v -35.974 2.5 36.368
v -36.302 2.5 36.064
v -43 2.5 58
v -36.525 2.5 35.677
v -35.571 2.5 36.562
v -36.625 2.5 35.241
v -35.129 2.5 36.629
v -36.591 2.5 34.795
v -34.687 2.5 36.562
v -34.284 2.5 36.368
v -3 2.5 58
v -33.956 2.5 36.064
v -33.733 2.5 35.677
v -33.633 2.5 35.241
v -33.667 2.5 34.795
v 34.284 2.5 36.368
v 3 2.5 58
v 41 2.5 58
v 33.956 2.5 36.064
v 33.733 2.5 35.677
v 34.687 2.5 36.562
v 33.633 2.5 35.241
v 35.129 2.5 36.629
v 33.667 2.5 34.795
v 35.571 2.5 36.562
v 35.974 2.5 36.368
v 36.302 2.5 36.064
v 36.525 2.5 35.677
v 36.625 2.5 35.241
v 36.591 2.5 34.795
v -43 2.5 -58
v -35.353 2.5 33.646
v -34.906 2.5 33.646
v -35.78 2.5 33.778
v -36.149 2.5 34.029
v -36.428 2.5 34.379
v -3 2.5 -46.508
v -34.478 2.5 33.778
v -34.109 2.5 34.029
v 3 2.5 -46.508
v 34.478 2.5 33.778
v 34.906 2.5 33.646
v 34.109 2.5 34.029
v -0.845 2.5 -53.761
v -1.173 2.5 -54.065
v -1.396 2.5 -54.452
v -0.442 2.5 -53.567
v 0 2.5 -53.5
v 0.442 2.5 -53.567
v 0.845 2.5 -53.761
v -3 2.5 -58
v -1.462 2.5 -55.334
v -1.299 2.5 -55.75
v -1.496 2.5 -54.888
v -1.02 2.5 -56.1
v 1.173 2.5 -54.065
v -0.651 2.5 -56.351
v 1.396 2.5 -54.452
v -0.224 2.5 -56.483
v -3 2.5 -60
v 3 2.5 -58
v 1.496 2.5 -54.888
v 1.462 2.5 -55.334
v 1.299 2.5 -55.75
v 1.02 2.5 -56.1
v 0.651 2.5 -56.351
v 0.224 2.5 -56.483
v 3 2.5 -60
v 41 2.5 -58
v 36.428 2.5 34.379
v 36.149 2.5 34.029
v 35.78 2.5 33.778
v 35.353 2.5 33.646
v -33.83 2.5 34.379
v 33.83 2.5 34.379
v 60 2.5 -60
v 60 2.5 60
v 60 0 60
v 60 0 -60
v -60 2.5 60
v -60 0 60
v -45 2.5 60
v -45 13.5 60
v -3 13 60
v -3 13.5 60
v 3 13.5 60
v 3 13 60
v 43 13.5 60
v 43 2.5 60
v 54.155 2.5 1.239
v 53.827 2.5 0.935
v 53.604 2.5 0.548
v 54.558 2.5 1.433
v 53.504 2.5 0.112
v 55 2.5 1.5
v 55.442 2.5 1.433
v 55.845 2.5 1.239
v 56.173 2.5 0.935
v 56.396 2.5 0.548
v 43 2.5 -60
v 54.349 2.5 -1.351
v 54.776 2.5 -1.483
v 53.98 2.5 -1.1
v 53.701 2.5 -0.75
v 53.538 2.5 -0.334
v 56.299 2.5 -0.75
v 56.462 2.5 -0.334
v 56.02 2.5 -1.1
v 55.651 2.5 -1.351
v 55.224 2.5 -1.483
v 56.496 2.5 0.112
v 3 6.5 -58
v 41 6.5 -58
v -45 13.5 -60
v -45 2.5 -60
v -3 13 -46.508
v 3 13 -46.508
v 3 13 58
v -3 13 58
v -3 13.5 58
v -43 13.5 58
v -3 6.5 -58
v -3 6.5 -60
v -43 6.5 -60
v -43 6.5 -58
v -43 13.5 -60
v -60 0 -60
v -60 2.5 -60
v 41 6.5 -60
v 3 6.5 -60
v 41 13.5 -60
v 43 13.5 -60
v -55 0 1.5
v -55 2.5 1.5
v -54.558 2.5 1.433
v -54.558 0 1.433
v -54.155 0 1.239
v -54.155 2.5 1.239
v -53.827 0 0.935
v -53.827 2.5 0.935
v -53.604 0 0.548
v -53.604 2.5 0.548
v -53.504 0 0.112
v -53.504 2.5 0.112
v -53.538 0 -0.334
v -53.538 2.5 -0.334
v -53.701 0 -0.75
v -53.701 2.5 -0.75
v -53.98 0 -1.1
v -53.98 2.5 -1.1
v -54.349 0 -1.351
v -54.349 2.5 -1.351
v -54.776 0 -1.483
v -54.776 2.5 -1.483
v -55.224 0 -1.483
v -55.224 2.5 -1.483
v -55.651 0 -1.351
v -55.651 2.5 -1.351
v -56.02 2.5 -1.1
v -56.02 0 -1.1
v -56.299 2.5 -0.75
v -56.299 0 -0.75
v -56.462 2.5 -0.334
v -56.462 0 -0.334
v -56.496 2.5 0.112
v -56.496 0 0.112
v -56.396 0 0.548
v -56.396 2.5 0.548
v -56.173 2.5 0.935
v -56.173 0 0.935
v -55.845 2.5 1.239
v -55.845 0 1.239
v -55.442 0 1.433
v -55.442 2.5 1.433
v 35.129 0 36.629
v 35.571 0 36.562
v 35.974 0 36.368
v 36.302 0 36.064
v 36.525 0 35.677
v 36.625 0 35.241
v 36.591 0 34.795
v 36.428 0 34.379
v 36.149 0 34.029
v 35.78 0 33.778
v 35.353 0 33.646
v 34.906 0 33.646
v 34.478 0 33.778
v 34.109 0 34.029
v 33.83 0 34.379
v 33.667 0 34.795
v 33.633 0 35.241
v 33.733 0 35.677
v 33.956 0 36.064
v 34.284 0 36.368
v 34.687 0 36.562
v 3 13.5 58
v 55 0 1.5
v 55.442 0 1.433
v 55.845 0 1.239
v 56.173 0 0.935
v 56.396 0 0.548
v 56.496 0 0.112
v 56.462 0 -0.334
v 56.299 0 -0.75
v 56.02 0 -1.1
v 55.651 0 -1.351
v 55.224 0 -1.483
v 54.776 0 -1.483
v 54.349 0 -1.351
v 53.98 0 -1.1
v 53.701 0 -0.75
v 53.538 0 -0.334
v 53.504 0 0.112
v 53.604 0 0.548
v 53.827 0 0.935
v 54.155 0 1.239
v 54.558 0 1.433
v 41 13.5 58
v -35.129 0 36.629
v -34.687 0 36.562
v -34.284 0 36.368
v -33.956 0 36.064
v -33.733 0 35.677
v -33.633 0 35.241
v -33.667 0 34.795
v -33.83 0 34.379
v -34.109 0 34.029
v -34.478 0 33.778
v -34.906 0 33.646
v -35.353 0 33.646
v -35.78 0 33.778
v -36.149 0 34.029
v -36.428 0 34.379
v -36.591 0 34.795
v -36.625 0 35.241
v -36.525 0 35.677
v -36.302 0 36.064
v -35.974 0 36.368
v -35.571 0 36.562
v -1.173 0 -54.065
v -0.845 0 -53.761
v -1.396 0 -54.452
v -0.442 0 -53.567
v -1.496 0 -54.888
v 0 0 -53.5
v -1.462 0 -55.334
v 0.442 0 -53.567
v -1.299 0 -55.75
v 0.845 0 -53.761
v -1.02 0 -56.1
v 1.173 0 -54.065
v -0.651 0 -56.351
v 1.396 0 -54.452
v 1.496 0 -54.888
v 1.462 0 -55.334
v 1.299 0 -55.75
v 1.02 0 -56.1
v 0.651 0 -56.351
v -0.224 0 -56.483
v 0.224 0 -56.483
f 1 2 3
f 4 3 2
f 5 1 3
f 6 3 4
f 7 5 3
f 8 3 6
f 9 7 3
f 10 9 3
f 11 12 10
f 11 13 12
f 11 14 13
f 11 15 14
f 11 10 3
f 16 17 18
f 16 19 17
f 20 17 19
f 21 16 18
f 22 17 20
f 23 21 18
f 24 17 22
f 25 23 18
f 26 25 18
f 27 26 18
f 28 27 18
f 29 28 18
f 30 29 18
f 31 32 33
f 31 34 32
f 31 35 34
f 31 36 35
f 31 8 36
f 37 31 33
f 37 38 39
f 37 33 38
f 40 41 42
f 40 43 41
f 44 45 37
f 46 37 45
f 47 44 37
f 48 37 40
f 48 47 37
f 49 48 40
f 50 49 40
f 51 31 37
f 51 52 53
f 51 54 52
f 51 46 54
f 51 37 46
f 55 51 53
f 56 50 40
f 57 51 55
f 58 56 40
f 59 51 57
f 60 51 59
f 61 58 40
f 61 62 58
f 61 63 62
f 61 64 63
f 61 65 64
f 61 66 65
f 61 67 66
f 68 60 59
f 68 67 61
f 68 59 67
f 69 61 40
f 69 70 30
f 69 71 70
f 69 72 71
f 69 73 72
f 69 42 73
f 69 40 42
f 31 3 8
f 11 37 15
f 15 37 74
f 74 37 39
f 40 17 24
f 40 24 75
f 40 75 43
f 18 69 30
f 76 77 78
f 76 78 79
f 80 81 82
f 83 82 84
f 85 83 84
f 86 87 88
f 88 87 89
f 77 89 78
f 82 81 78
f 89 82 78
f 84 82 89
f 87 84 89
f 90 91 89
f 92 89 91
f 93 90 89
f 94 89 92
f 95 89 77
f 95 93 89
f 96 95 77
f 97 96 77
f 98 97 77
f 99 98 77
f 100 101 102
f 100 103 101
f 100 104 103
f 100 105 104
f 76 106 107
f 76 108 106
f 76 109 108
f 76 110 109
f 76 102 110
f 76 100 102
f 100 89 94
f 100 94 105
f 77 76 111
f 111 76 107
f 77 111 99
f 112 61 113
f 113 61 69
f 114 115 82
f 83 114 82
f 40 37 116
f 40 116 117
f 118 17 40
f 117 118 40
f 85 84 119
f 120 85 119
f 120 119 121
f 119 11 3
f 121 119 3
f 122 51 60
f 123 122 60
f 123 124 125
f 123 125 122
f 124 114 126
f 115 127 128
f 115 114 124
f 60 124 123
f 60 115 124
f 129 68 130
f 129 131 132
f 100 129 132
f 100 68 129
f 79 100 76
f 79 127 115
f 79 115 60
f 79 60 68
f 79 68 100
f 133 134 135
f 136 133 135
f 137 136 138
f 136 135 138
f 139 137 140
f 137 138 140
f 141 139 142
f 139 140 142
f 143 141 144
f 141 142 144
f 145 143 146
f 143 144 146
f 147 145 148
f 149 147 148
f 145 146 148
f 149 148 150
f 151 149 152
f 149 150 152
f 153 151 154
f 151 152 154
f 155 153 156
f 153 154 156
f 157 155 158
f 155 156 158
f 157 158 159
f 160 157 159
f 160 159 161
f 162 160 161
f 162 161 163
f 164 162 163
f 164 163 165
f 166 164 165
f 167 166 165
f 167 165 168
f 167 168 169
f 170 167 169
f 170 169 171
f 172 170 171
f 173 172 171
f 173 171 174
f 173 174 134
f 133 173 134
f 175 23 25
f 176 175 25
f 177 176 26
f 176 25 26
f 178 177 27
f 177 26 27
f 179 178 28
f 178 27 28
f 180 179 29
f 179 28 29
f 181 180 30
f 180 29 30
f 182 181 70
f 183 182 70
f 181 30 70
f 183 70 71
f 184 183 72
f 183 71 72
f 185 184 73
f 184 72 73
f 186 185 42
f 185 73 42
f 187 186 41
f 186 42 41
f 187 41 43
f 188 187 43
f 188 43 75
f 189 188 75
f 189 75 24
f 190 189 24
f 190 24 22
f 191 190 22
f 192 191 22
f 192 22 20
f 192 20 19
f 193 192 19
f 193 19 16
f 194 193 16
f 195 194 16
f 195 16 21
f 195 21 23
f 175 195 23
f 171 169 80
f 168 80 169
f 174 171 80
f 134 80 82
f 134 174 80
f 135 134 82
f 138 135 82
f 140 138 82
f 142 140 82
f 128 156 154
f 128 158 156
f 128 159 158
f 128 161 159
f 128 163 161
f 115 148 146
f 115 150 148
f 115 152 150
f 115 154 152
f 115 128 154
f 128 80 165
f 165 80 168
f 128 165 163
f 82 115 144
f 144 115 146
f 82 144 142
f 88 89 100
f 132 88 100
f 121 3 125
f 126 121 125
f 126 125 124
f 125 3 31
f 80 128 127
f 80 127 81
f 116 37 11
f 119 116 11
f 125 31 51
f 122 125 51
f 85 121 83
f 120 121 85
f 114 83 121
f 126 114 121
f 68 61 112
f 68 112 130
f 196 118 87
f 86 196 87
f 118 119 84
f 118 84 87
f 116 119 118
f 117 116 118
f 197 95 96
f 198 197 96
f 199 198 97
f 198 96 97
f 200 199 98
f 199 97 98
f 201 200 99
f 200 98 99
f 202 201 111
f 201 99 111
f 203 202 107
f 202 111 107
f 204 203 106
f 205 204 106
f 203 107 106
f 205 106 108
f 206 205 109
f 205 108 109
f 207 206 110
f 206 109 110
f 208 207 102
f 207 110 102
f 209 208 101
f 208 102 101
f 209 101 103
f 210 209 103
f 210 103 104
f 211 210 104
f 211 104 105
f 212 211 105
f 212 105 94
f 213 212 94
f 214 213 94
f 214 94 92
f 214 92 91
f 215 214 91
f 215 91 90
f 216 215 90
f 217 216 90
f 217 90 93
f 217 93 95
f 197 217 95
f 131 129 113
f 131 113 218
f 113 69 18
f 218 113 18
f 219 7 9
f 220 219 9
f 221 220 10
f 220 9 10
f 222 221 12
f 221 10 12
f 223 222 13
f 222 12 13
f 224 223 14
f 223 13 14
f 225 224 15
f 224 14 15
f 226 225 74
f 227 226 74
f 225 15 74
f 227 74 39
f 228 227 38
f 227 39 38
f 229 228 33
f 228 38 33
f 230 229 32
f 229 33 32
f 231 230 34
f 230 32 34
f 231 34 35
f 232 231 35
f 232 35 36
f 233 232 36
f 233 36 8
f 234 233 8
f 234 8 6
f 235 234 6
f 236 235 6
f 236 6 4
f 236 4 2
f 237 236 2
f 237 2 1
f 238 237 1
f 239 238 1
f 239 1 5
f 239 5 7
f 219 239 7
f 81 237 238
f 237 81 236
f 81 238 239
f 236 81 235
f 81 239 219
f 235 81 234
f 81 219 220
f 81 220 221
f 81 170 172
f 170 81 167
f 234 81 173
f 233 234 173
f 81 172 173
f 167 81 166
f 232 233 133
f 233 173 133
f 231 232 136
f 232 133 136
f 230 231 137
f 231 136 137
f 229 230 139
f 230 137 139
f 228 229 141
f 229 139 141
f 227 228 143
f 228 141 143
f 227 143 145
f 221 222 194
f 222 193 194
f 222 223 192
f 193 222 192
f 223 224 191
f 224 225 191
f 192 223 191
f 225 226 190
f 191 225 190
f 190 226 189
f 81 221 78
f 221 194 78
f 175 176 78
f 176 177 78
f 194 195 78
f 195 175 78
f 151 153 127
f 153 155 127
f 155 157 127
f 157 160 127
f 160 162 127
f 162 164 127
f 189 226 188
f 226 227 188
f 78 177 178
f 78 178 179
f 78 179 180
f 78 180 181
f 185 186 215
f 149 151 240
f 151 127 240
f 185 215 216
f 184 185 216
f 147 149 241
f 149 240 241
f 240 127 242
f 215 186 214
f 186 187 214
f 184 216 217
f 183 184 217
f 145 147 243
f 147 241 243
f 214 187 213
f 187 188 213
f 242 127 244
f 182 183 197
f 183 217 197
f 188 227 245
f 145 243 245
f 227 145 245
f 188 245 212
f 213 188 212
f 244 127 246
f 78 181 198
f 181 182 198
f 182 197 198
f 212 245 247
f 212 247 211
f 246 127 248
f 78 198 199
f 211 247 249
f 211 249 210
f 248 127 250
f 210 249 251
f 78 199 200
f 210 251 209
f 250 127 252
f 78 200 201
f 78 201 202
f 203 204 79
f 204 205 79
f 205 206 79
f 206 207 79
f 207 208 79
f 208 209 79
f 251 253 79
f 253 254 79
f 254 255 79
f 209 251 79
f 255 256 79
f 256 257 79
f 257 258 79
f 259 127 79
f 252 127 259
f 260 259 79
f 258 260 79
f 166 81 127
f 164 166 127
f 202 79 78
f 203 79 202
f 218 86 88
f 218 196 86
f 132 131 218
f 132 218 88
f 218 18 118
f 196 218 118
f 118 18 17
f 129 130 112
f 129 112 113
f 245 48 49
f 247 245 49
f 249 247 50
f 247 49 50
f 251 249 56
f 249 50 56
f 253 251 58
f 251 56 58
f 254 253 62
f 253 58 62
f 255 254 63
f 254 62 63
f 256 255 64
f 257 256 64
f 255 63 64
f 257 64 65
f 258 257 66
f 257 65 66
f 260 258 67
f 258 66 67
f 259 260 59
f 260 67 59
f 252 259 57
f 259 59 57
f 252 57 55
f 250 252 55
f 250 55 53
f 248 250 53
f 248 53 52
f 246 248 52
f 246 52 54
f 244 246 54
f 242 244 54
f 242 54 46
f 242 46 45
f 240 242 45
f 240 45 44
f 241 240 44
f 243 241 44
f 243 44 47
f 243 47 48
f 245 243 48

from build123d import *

# Parameters (mm, degrees)
BOSS_EXTRUDE3_DEPTH  = 2.5
BOSS_EXTRUDE4_DEPTH  = 2.5
BOSS_EXTRUDE5_DEPTH  = 10.5
BOSS_EXTRUDE8_DEPTH  = 11
BOSS_EXTRUDE9_DEPTH  = 11
SKETCH8_W            = 84
SKETCH8_H            = 2
BOSS_EXTRUDE11_DEPTH = 4
SKETCH9_W            = 6
SKETCH9_H            = 7.053661792
CUT_EXTRUDE1_DEPTH   = 28
SKETCH10_W           = 6
SKETCH10_H           = 6.438726715
CUT_EXTRUDE4_DEPTH   = 11
SKETCH11_R           = 1.5
CUT_EXTRUDE5_DEPTH   = 14
SKETCH13_R           = 1.5
CUT_EXTRUDE6_DEPTH   = 14
SKETCH15_R           = 1.5
CUT_EXTRUDE7_DEPTH   = 14


with BuildPart() as part:
    # Sketch1 → Boss-Extrude3 (new body)
    with BuildSketch(Plane(origin=(0, 0, 0), x_dir=(1, 0, 0), z_dir=(0, 1, 0))):
        with BuildLine():
            Line((-44.72135955, -40), (0, -40))
            Line((0, -40), (44.72135955, -40))
            ThreePointArc((44.72135955, -40), (56.050341538, -21.409325386), (60, 0))
            ThreePointArc((60, 0), (-21.409325386, 56.050341538), (-44.72135955, -40))
        make_face()
        with BuildLine():
            Line((-33.166247904, -50), (0, -50))
            Line((0, -50), (0, -40))
            Line((0, -40), (-44.72135955, -40))
            ThreePointArc((-44.72135955, -40), (-39.2634671, -45.369374597), (-33.166247904, -50))
        make_face()
        with BuildLine():
            Line((0, -40), (0, -50))
            Line((0, -50), (33.166247904, -50))
            ThreePointArc((33.166247904, -50), (39.2634671, -45.369374597), (44.72135955, -40))
            Line((44.72135955, -40), (0, -40))
        make_face()
        with BuildLine():
            Line((0, -50), (0, -60))
            add(Edge.make_bspline(
                [(0, -60), (2.493909774, -59.986931125), (4.933150425, -59.785698627)],
                knots=[0, 0, 0, 0.138485859, 0.138485859, 0.138485859], degree=2))
            add(Edge.make_bspline(
                [(4.933150425, -59.785698627), (12.350363719, -59.151298506), (19.667130305, -57.122142348), (26.368544437, -53.878843782)],
                knots=[0.549095967, 0.549095967, 0.549095967, 0.549095967, 0.769976712, 0.769976712, 0.769976712, 0.769976712], degree=3))
            add(Edge.make_bspline(
                [(26.368544437, -53.878843782), (29.836187059, -52.176190697), (33.166247904, -50)],
                knots=[0.7803077, 0.7803077, 0.7803077, 1, 1, 1], degree=2))
            Line((33.166247904, -50), (0, -50))
        make_face()
        with BuildLine():
            add(Edge.make_bspline(
                [(-9.467287752, -59.24160526), (-4.836502075, -59.974590334), (0, -60)],
                knots=[0.731444001, 0.731444001, 0.731444001, 1, 1, 1], degree=2))
            Line((0, -60), (0, -50))
            Line((0, -50), (-33.166247904, -50))
            add(Edge.make_bspline(
                [(-33.166247904, -50), (-28.091057223, -53.316740978), (-22.696065652, -55.533505256)],
                knots=[0, 0, 0, 0.334842238, 0.334842238, 0.334842238], degree=2))
            add(Edge.make_bspline(
                [(-22.696065652, -55.533505256), (-18.44552317, -57.261077796), (-13.998129322, -58.510750178), (-9.467287752, -59.24160526)],
                knots=[0.269647974, 0.269647974, 0.269647974, 0.269647974, 0.406041898, 0.406041898, 0.406041898, 0.406041898], degree=3))
        make_face()
    extrude(amount=BOSS_EXTRUDE3_DEPTH)

    # Sketch3 → Boss-Extrude4 (add)
    with BuildSketch(Plane(origin=(0, 2.5, 0), x_dir=(1, 0, 0), z_dir=(0, 1, 0))):
        Polygon((0, 60), (-60, 60), (-60, -60), (60, -60), (60, 60), align=None)
    extrude(amount=-BOSS_EXTRUDE4_DEPTH)

    # Sketch4 → Boss-Extrude5 (add)
    with BuildSketch(Plane(origin=(0, 2.5, 0), x_dir=(1, 0, 0), z_dir=(0, 1, 0))):
        Polygon((3, 60), (0, 60), (-3, 60), (-3, -60), (3, -60), align=None)
    extrude(amount=BOSS_EXTRUDE5_DEPTH)

    # Sketch5 → Boss-Extrude8 (add)
    with BuildSketch(Plane(origin=(0, 2.5, 0), x_dir=(1, 0, 0), z_dir=(0, 1, 0))):
        Polygon((-43, -60), (-3, -60), (-3, -58), (-43, -58), (-43, 60), (-45, 60), (-45, -58), (-45, -60), align=None)
    extrude(amount=BOSS_EXTRUDE8_DEPTH)

    # Sketch7 → Boss-Extrude9 (add)
    with BuildSketch(Plane(origin=(0, 2.5, 0), x_dir=(1, 0, 0), z_dir=(0, 1, 0))):
        Polygon((3, -60), (43, -60), (43, 60), (41, 60), (41, -58), (3, -58), align=None)
    extrude(amount=BOSS_EXTRUDE9_DEPTH)

    # Sketch8 → Boss-Extrude11 (add)
    with BuildSketch(Plane(origin=(0, 2.5, 0), x_dir=(1, 0, 0), z_dir=(0, 1, 0))):
        with Locations((-1, 59)):
            Rectangle(SKETCH8_W, SKETCH8_H)
    extrude(amount=BOSS_EXTRUDE11_DEPTH)

    # Sketch9 → Cut-Extrude1 (cut)
    with BuildSketch(Plane(origin=(0, 2.5, 0), x_dir=(1, 0, 0), z_dir=(0, 1, 0))):
        with Locations((0, 56.473169104)):
            Rectangle(SKETCH9_W, SKETCH9_H)
    extrude(amount=CUT_EXTRUDE1_DEPTH, mode=Mode.SUBTRACT)

    # Sketch10 → Cut-Extrude4 (cut)
    with BuildSketch(Plane(origin=(0, 2.5, 0), x_dir=(1, 0, 0), z_dir=(0, 1, 0))):
        with Locations((0, 49.72697485)):
            Rectangle(SKETCH10_W, SKETCH10_H)
    extrude(amount=CUT_EXTRUDE4_DEPTH, mode=Mode.SUBTRACT)

    # Sketch11 → Cut-Extrude5 (cut)
    with BuildSketch(Plane(origin=(0, 2.5, 0), x_dir=(1, 0, 0), z_dir=(0, 1, 0))):
        with Locations(Location((-35.129064889, -35.129064889, 0), (0, 0, 270))):
            Circle(SKETCH11_R)
        with Locations(Location((35.129064889, -35.129064889, 0), (0, 0, 270))):
            Circle(SKETCH11_R)
    extrude(amount=-CUT_EXTRUDE5_DEPTH, mode=Mode.SUBTRACT)

    # Sketch13 → Cut-Extrude6 (cut)
    with BuildSketch(Plane(origin=(0, 13, 0), x_dir=(1, 0, 0), z_dir=(0, 1, 0))):
        with Locations(Location((-55, 0, 0), (0, 0, 270))):
            Circle(SKETCH13_R)
        with Locations(Location((55, 0, 0), (0, 0, 270))):
            Circle(SKETCH13_R)
    extrude(amount=-CUT_EXTRUDE6_DEPTH, mode=Mode.SUBTRACT)

    # Sketch15 → Cut-Extrude7 (cut)
    with BuildSketch(Plane(origin=(0, 2.5, 0), x_dir=(1, 0, 0), z_dir=(0, 1, 0))):
        with Locations(Location((0, 55, 0), (0, 0, 270))):
            Circle(SKETCH15_R)
    extrude(amount=-CUT_EXTRUDE7_DEPTH, mode=Mode.SUBTRACT)


solid = part.part
